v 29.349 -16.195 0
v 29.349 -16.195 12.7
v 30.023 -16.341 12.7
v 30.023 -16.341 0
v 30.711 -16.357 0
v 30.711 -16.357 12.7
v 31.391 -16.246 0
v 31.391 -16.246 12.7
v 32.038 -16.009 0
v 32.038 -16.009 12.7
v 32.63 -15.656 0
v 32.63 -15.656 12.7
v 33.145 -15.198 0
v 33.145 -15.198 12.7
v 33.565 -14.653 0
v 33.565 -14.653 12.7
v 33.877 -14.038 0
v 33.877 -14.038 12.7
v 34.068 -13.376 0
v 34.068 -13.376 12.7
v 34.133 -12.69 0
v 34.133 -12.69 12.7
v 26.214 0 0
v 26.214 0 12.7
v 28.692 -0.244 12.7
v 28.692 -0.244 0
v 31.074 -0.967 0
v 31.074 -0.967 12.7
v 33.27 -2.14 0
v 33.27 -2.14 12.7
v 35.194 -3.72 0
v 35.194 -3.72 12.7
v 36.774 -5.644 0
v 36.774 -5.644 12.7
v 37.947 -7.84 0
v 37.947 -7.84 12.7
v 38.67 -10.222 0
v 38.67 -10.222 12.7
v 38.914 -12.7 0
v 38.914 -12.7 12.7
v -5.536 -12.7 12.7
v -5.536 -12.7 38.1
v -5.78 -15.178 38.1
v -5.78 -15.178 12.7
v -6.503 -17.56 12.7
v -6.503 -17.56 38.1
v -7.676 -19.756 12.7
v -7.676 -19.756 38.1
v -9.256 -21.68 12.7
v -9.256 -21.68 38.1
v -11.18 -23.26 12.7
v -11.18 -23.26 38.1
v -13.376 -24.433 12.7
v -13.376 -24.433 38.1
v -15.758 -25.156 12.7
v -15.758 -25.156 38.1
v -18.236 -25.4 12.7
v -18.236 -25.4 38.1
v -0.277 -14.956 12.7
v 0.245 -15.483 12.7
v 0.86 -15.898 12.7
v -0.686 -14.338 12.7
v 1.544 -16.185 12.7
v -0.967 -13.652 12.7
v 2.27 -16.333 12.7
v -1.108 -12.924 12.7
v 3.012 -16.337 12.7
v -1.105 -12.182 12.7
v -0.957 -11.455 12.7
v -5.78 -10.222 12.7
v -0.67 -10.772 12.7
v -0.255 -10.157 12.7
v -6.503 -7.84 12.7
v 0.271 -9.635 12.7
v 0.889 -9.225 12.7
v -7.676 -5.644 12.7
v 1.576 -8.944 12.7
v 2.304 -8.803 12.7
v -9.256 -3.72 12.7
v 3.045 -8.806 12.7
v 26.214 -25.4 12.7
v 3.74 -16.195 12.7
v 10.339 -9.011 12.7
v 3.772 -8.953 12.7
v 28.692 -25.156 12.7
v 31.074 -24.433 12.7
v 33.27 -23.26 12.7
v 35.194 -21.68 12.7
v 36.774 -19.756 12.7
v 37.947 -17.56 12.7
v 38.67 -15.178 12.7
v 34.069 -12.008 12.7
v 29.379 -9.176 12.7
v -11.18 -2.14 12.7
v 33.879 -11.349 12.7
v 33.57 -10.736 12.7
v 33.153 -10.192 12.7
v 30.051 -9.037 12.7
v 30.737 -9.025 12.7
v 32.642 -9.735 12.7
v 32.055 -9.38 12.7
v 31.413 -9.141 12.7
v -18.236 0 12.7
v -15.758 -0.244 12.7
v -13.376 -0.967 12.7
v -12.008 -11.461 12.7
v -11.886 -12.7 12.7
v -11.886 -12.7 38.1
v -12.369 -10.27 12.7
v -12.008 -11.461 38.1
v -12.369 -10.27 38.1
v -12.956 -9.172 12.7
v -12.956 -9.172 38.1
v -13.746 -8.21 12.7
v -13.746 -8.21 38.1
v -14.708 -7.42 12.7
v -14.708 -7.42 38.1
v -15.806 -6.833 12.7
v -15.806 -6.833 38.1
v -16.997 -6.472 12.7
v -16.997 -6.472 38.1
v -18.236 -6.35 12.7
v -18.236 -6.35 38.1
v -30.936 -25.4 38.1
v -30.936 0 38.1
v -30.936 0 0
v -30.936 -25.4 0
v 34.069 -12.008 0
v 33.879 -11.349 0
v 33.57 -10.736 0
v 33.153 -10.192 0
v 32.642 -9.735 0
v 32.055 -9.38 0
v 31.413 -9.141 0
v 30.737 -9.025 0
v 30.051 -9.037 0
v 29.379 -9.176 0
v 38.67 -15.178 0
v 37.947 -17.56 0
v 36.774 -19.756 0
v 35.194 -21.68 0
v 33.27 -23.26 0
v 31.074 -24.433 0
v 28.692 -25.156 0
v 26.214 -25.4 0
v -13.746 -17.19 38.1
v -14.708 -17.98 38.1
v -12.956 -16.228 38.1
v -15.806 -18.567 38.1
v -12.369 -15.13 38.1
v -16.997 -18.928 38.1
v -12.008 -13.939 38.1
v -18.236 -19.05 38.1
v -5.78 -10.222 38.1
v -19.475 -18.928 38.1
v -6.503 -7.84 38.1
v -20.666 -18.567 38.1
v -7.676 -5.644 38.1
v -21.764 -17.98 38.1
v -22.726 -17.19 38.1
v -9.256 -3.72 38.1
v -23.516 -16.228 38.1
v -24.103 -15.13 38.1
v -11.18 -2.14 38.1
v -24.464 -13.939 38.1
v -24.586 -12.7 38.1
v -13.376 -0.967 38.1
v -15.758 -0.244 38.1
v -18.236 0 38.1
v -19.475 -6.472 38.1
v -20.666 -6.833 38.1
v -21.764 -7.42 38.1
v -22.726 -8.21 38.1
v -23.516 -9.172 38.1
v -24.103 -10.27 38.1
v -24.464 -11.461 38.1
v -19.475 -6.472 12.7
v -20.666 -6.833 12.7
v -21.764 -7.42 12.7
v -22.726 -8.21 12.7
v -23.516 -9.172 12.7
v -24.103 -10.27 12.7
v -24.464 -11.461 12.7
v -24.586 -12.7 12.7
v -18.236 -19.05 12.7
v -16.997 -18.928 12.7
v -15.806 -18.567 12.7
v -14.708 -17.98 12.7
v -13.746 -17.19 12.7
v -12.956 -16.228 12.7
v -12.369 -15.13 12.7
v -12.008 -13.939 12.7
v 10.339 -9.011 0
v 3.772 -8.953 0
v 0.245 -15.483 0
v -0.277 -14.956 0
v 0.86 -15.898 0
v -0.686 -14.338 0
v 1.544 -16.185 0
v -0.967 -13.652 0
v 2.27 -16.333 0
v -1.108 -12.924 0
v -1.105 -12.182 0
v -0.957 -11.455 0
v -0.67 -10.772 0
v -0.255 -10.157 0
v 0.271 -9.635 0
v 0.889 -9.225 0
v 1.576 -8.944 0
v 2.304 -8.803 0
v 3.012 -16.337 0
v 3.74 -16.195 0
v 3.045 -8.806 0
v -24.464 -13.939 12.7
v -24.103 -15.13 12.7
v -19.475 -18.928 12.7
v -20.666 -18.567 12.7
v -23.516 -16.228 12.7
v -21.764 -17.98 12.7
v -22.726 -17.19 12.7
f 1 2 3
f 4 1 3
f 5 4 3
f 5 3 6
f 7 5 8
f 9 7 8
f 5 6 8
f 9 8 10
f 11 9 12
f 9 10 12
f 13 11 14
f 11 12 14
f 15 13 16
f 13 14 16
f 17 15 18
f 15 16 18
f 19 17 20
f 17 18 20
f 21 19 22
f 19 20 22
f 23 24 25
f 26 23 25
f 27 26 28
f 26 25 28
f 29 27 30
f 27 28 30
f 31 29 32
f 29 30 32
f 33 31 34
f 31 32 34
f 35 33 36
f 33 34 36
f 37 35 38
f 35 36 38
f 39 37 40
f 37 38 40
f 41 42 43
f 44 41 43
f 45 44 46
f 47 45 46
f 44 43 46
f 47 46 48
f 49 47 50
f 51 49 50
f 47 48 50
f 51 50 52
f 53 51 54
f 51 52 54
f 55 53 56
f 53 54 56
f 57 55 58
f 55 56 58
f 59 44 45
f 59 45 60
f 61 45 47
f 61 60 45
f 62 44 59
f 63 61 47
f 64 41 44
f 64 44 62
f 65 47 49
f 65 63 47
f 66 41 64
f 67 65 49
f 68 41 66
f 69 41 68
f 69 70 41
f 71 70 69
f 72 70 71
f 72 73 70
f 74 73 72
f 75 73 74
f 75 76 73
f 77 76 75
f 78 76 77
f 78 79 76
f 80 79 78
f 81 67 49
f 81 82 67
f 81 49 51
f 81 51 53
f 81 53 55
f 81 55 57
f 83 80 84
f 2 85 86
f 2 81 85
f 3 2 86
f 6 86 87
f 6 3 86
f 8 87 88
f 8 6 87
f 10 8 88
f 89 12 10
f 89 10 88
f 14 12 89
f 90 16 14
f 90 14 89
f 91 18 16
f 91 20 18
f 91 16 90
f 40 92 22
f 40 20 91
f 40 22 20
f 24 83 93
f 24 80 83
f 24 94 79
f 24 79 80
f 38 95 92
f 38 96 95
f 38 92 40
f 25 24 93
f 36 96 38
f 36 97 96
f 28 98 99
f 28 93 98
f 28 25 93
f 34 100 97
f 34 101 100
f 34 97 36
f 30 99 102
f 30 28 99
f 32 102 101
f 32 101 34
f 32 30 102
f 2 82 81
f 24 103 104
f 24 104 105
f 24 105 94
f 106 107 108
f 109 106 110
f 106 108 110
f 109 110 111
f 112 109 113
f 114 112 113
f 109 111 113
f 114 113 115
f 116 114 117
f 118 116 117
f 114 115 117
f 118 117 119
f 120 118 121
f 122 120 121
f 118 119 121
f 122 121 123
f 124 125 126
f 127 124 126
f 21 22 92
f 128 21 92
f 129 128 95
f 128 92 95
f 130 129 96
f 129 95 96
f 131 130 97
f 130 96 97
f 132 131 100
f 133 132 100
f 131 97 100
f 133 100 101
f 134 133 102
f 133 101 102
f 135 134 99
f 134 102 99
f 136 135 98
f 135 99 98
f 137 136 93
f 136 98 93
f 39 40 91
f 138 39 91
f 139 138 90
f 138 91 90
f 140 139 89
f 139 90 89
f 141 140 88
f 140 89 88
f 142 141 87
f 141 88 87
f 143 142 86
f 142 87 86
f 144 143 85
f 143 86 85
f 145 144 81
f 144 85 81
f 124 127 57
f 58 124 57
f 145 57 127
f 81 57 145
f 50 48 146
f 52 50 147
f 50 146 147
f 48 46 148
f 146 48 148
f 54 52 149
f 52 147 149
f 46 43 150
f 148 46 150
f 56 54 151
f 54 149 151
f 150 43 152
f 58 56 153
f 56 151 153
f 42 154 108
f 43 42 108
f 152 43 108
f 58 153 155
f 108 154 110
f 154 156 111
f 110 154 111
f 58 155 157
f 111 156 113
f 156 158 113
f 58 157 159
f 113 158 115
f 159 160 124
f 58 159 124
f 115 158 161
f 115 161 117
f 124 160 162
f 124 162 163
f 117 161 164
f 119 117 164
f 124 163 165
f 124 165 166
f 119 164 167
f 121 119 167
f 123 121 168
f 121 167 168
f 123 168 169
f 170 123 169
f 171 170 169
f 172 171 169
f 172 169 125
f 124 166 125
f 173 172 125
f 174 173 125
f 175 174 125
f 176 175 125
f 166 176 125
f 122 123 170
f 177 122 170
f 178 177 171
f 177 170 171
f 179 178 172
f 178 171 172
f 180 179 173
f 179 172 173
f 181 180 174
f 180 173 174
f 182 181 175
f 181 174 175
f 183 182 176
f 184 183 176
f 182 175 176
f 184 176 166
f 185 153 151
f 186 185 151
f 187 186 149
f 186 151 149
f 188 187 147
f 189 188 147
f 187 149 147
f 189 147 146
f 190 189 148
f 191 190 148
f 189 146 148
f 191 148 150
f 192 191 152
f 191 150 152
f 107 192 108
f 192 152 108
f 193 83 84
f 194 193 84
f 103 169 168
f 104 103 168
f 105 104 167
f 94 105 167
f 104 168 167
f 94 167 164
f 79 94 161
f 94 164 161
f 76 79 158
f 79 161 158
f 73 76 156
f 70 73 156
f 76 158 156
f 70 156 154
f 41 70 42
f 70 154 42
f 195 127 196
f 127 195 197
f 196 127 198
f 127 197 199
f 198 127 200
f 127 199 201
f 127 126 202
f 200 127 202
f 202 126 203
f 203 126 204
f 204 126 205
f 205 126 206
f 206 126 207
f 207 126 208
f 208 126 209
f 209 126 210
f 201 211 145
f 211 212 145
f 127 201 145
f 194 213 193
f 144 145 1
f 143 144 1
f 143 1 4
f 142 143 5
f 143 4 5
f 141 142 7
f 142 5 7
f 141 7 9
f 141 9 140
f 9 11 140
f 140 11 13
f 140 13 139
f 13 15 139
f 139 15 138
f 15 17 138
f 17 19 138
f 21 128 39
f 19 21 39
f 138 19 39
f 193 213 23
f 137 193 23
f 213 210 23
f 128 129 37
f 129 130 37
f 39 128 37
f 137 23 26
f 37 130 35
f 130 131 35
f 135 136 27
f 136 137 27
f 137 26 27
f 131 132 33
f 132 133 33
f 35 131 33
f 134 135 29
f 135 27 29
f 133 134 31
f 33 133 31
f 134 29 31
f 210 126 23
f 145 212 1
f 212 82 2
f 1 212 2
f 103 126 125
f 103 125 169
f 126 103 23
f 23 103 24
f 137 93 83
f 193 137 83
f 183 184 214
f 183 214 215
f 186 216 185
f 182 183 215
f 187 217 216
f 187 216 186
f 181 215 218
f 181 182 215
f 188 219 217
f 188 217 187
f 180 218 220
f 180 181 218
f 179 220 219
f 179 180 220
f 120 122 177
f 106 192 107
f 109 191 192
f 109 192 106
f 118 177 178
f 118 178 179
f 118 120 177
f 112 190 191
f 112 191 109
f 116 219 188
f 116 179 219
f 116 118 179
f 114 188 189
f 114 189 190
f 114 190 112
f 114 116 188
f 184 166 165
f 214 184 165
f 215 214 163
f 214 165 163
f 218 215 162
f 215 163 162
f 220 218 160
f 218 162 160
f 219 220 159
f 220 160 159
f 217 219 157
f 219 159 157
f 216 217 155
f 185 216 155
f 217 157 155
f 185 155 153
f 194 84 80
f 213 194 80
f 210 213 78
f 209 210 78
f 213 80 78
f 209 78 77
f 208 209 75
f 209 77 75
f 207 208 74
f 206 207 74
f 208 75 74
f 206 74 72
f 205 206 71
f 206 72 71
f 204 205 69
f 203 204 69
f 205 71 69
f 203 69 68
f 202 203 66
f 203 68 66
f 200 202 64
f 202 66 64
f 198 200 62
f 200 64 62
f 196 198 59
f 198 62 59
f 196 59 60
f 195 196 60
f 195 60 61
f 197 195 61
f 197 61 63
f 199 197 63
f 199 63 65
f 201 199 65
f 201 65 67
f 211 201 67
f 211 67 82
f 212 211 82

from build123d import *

# Parameters (mm, degrees)
F1_DEPTH = 25.4
F3_DEPTH = 25.4
F5_DEPTH = 25.4
F7_DEPTH = 25.4
F9_DEPTH = 25.4


# Not quite as in the source:
# - a feature names something its author has since deleted; it is built from what else it names


with BuildPart() as f1:
    # F0 (on Front) → F1 (new body)
    with BuildSketch(Plane.XZ):
        Polygon((-5.5358944303, 38.1), (-30.9358944303, 38.1), (-30.9358944303, 0), (38.9141055698, 0), (38.9141055697, 12.7), (-5.5358944303, 12.7), align=None)
    extrude(amount=F1_DEPTH)

    # F2 (on face) → F3 (cut)
    with BuildSketch(Plane.XY.offset(38.1)):
        with BuildLine():
            ThreePointArc((-11.8858944302, -12.7), (-13.7457663697, -8.2098719395), (-18.2358944302, -6.35))
            Line((-18.2358944303, -6.35), (-18.2358944303, -12.7))
            Line((-18.2358944302, -12.7), (-11.8858944302, -12.7))
        make_face()
        with BuildLine():
            Line((-11.8858944302, -12.7), (-18.2358944302, -12.7))
            Line((-18.2358944303, -12.7), (-18.2358944303, -19.05))
            ThreePointArc((-18.2358944302, -19.05), (-13.7457663697, -17.1901280605), (-11.8858944302, -12.7))
        make_face()
        with BuildLine():
            Line((-18.2358944302, -12.7), (-24.5858944303, -12.7))
            ThreePointArc((-24.5858944303, -12.7), (-22.7260224908, -17.1901280605), (-18.2358944302, -19.05))
            Line((-18.2358944303, -19.05), (-18.2358944303, -12.7))
        make_face()
        with BuildLine():
            Line((-18.2358944303, -12.7), (-18.2358944303, -6.35))
            ThreePointArc((-18.2358944302, -6.35), (-22.7260224908, -8.2098719395), (-24.5858944303, -12.7))
            Line((-24.5858944303, -12.7), (-18.2358944302, -12.7))
        make_face()
        with BuildLine():
            Line((-5.5358944303, 0), (-18.2358944303, 0))
            ThreePointArc((-18.2358944303, 0), (-9.2556383092, -3.7197438789), (-5.5358944303, -12.7))
            Line((-5.5358944303, -12.7), (-5.5358944303, 0))
        make_face()
        with BuildLine():
            Line((-5.5358944303, -25.4), (-5.5358944303, -12.7))
            ThreePointArc((-5.5358944303, -12.7), (-9.2556383092, -21.6802561211), (-18.2358944303, -25.4))
            Line((-18.2358944303, -25.4), (-5.5358944303, -25.4))
        make_face()
    extrude(amount=-F3_DEPTH, mode=Mode.SUBTRACT)

    # F4 (on face) → F5 (cut)
    with BuildSketch(Plane.XY.offset(12.7)):
        with BuildLine():
            Line((29.3793692031, -9.1760675128), (10.3391055697, -9.0105000585))
            Line((10.3391055697, -9.0105000585), (10.3391055697, -16.195377335))
            Line((10.3391055697, -16.195377335), (29.3492708089, -16.195377335))
            ThreePointArc((29.3492708089, -16.195377335), (26.7811699001, -12.6746460258), (29.3793692031, -9.1760675128))
        make_face()
        with BuildLine():
            Line((10.3391055697, -16.195377335), (10.3391055697, -9.0105000585))
            Line((10.3391055697, -9.0105000585), (3.7719008779, -8.9533939498))
            ThreePointArc((3.7719008779, -8.9533939498), (5.7024746114, -10.3218470376), (6.442491519, -12.5695466995))
            ThreePointArc((6.442491519, -12.5695466995), (5.6925301995, -14.8306497777), (3.7399555387, -16.195377335))
            Line((3.7399555387, -16.195377335), (10.3391055697, -16.195377335))
        make_face()
        with BuildLine():
            ThreePointArc((34.132825273, -12.6904076897), (32.6422382322, -9.7346534929), (29.3793692031, -9.1760675128))
            Line((29.3793692031, -9.1760675128), (30.4569806904, -9.1854380444))
            Line((30.4569806904, -9.1854380444), (30.4569806904, -16.195377335))
            Line((30.4569806904, -16.195377335), (29.3492708089, -16.195377335))
            ThreePointArc((29.3492708089, -16.195377335), (32.6295441565, -15.6555048856), (34.132825273, -12.6904076897))
        make_face()
        with BuildLine():
            Line((30.4569806904, -9.1854380444), (29.3793692031, -9.1760675128))
            ThreePointArc((29.3793692031, -9.1760675128), (26.7811699001, -12.6746460258), (29.3492708089, -16.195377335))
            Line((29.3492708089, -16.195377335), (30.4569806904, -16.195377335))
            Line((30.4569806904, -16.195377335), (30.4569806904, -9.1854380444))
        make_face()
        with BuildLine():
            ThreePointArc((6.442491519, -12.5695466995), (5.7024746114, -10.3218470376), (3.7719008779, -8.9533939498))
            Line((3.7719008779, -8.9533939498), (2.6589436457, -8.9437160641))
            Line((2.6589436457, -8.9437160641), (2.6589436457, -16.195377335))
            Line((2.6589436457, -16.195377335), (3.7399555387, -16.195377335))
            ThreePointArc((3.7399555387, -16.195377335), (5.6925301995, -14.8306497777), (6.442491519, -12.5695466995))
        make_face()
        with BuildLine():
            Line((2.6589436457, -8.9437160641), (3.7719008779, -8.9533939498))
            ThreePointArc((3.7719008779, -8.9533939498), (-1.1245674179, -12.5528571357), (3.7399555387, -16.195377335))
            Line((3.7399555387, -16.195377335), (2.6589436457, -16.195377335))
            Line((2.6589436457, -16.195377335), (2.6589436457, -8.9437160641))
        make_face()
    extrude(amount=-F5_DEPTH, mode=Mode.SUBTRACT)

    # F6 (on face) → F7 (cut)
    with BuildSketch(Plane.XY.offset(12.7)):
        with BuildLine():
            Line((38.9141055697, -12.7), (38.9141055697, 0))
            Line((38.9141055697, 0), (26.2141055698, 0))
            ThreePointArc((26.2141055698, 0), (35.1943616908, -3.7197438789), (38.9141055697, -12.7))
        make_face()
    extrude(amount=-F7_DEPTH, mode=Mode.SUBTRACT)

    # F8 (on face) → F9 (cut)
    with BuildSketch(Plane.XY.offset(12.7)):
        with BuildLine():
            Line((38.9141055697, -25.4), (38.9141055697, -12.7))
            ThreePointArc((38.9141055697, -12.7), (35.1943616908, -21.6802561211), (26.2141055698, -25.4))
            Line((26.2141055698, -25.4), (38.9141055697, -25.4))
        make_face()
    extrude(amount=-F9_DEPTH, mode=Mode.SUBTRACT)


solid = f1.part
